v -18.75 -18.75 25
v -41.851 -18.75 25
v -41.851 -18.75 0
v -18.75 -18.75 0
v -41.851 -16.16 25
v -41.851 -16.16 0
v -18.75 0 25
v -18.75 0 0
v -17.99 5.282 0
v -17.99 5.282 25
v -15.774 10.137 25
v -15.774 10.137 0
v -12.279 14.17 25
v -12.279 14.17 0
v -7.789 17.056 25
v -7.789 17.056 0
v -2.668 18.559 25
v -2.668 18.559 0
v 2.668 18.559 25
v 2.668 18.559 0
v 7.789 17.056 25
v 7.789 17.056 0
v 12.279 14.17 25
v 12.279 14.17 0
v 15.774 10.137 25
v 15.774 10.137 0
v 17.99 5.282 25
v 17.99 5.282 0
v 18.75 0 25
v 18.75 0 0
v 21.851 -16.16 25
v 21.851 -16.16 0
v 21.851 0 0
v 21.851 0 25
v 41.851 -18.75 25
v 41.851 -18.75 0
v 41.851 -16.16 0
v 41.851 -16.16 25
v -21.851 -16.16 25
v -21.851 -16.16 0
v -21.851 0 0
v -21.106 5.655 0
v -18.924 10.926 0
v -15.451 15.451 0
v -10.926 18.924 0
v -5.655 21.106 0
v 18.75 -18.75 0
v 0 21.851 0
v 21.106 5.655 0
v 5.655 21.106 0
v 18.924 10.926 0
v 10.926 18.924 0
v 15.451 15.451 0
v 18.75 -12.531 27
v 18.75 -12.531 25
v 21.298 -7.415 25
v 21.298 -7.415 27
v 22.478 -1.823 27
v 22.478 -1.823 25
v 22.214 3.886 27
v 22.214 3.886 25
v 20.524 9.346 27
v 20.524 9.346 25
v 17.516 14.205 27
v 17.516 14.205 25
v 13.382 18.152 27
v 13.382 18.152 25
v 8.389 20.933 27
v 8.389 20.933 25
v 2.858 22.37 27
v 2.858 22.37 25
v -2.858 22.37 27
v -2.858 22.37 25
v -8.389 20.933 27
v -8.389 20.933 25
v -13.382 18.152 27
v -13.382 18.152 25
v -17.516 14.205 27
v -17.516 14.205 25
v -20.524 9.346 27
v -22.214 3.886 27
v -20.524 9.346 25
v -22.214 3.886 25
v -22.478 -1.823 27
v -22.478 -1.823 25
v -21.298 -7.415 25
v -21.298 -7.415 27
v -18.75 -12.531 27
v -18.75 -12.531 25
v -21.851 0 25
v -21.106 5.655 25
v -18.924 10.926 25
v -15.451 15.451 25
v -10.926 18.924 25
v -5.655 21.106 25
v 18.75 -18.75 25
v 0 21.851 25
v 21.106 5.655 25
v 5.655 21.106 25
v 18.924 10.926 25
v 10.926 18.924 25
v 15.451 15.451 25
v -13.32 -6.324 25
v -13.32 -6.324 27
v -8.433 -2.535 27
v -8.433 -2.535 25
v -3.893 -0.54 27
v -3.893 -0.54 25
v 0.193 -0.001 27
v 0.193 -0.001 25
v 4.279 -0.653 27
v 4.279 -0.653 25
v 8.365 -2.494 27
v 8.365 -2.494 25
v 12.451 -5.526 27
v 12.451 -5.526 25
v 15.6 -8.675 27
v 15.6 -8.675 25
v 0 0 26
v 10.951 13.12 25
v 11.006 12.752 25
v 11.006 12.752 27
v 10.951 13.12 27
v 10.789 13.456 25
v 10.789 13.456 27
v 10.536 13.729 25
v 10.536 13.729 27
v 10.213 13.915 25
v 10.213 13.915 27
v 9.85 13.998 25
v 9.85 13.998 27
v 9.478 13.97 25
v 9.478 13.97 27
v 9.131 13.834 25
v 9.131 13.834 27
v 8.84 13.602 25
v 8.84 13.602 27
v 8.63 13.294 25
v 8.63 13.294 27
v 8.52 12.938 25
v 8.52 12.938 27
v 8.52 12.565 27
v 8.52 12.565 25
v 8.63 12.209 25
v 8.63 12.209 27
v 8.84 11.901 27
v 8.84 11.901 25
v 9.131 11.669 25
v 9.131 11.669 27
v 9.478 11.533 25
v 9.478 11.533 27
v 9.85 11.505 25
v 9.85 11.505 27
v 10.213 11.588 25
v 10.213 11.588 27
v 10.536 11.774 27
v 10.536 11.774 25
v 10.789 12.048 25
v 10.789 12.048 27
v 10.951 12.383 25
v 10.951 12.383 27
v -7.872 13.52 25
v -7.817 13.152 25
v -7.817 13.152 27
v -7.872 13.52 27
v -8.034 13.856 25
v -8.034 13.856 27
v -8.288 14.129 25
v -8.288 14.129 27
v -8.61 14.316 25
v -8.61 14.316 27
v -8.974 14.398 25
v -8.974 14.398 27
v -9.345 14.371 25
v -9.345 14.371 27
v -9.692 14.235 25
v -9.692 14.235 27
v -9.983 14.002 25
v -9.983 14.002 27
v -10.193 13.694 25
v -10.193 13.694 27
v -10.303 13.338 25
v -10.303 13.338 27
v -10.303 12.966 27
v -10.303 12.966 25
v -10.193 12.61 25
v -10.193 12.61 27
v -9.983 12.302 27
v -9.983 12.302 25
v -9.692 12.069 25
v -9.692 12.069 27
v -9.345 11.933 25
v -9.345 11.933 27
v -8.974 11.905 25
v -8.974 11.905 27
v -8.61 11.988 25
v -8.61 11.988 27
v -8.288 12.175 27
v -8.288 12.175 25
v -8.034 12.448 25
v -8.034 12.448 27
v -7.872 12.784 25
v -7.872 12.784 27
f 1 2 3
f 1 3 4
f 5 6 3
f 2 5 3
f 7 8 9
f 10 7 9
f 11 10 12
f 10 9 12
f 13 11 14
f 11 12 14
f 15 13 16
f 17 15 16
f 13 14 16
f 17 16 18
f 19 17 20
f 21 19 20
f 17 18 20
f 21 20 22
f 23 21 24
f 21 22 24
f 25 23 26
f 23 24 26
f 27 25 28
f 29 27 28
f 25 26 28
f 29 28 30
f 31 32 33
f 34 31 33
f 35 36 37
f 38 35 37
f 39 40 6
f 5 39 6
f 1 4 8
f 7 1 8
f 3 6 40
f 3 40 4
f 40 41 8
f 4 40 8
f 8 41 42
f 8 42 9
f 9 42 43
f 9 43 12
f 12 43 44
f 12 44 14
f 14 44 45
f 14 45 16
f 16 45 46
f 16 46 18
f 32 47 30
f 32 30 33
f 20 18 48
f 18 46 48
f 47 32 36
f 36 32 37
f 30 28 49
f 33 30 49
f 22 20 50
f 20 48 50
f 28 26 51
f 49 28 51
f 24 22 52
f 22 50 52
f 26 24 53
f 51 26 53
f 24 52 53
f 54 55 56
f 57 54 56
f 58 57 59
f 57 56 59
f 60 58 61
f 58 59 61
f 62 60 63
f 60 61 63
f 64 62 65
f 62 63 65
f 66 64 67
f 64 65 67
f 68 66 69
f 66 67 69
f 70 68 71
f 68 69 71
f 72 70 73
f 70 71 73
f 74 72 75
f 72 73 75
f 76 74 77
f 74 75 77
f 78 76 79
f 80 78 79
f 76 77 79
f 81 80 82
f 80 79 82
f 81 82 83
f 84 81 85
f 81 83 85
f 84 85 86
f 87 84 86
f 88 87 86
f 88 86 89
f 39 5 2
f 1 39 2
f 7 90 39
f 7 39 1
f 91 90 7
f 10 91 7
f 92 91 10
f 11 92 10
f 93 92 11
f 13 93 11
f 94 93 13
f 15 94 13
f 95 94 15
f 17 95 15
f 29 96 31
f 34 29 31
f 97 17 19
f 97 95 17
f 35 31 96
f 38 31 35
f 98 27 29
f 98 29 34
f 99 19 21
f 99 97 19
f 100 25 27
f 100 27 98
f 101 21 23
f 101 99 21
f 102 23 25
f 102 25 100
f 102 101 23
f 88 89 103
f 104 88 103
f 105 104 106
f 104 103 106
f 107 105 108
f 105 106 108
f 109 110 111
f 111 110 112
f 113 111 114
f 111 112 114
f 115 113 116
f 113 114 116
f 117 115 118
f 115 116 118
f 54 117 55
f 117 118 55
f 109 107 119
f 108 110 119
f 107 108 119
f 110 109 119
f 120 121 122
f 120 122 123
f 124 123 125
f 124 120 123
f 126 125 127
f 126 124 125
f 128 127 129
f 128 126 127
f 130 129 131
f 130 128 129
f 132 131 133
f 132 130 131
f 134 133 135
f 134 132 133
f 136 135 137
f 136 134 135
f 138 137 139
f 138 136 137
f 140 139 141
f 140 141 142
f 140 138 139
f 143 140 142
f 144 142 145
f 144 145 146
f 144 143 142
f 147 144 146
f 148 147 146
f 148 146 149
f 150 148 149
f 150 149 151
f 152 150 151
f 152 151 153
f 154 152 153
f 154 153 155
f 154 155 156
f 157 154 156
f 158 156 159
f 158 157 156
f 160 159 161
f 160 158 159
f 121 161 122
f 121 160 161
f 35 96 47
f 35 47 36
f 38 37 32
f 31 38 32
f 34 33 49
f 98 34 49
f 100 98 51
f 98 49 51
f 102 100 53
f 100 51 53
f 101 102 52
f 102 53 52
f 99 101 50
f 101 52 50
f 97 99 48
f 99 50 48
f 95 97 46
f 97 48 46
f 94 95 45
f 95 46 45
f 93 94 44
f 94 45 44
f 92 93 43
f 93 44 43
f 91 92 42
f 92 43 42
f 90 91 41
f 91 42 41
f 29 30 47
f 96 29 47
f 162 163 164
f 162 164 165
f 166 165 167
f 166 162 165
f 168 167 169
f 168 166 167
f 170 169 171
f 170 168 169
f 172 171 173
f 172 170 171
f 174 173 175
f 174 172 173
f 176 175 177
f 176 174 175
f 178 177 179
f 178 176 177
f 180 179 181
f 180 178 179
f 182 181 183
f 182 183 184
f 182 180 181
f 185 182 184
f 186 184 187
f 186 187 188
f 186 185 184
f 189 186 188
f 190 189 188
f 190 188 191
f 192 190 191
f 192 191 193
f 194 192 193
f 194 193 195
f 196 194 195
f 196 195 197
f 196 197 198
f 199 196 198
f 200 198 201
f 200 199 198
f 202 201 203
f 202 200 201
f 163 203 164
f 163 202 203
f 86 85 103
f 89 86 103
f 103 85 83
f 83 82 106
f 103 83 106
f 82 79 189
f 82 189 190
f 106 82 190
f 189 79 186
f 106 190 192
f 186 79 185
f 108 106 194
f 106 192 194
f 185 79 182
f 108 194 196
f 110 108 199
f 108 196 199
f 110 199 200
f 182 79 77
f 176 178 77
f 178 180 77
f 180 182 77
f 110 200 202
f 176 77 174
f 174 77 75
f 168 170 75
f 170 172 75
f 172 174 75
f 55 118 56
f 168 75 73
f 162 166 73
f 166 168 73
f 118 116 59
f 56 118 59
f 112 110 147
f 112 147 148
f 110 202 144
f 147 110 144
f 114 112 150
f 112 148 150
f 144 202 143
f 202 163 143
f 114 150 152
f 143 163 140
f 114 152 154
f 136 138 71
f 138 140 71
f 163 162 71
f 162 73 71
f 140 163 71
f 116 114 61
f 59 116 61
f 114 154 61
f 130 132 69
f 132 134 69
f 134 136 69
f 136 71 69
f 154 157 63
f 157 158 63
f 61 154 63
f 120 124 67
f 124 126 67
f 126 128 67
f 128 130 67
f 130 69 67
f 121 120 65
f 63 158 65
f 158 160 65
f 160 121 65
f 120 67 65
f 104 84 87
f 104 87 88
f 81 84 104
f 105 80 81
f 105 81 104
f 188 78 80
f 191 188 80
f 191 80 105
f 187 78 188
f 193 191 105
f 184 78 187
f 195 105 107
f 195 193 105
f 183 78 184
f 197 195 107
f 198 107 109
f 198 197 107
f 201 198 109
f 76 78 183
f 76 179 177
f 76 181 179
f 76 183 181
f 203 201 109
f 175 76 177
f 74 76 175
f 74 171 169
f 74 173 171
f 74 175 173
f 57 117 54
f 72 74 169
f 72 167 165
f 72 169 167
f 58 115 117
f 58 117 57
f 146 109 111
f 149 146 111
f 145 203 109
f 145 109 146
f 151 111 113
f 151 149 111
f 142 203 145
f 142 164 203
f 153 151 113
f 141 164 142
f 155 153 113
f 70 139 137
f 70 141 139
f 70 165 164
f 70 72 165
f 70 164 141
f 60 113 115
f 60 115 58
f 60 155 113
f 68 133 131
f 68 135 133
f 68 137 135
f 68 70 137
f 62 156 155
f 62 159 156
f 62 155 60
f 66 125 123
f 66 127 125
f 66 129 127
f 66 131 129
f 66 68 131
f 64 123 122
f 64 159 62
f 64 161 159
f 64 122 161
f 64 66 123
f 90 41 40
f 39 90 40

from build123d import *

# Parameters (mm, degrees)
BOSS_EXTRUDE1_DEPTH = 25
SKETCH2_R           = 1.25
BOSS_EXTRUDE2_DEPTH = 2


with BuildPart() as part:
    # Sketch1 → Boss-Extrude1 (new body)
    with BuildSketch(Plane.XY):
        with BuildLine():
            Line((18.75, 0), (18.75, -18.75))
            Line((18.75, -18.75), (36.000411031, -18.75))
            Line((36.000411031, -18.75), (41.851049495, -18.75))
            Line((41.851049495, -18.75), (41.851049495, -16.160388188))
            Line((41.851049495, -16.160388188), (21.851049495, -16.160388188))
            Line((21.851049495, -16.160388188), (21.851049495, 0))
            ThreePointArc((21.851049495, 0), (0, 21.851049495), (-21.851049495, 0))
            Line((-21.851049495, 0), (-21.851049495, -16.160388188))
            Line((-21.851049495, -16.160388188), (-41.851049495, -16.160388188))
            Line((-41.851049495, -16.160388188), (-41.851049495, -18.75))
            Line((-41.851049495, -18.75), (-18.75, -18.75))
            Line((-18.75, -18.75), (-18.75, 0))
            ThreePointArc((-18.75, 0), (0, 18.75), (18.75, 0))
        make_face()
    extrude(amount=BOSS_EXTRUDE1_DEPTH)


with BuildPart() as body_2:
    # Sketch2 → Boss-Extrude2 (new body)
    with BuildSketch(Plane.XY.offset(25)):
        with BuildLine():
            ThreePointArc((18.75, -12.530827957), (0, 22.551810333), (-18.75, -12.530827957))
            add(Edge.make_bspline(
                [(-18.75, -12.530827957), (0, 12.530827957), (18.75, -12.530827957)],
                knots=[0, 0, 0, 1, 1, 1], degree=2))
        make_face()
        with Locations((9.756436044, 12.751697465)):
            Circle(SKETCH2_R, mode=Mode.SUBTRACT)
        with Locations((-9.066924839, 13.151988727)):
            Circle(SKETCH2_R, mode=Mode.SUBTRACT)
    extrude(amount=BOSS_EXTRUDE2_DEPTH)


solid = Compound([part.part, body_2.part])
